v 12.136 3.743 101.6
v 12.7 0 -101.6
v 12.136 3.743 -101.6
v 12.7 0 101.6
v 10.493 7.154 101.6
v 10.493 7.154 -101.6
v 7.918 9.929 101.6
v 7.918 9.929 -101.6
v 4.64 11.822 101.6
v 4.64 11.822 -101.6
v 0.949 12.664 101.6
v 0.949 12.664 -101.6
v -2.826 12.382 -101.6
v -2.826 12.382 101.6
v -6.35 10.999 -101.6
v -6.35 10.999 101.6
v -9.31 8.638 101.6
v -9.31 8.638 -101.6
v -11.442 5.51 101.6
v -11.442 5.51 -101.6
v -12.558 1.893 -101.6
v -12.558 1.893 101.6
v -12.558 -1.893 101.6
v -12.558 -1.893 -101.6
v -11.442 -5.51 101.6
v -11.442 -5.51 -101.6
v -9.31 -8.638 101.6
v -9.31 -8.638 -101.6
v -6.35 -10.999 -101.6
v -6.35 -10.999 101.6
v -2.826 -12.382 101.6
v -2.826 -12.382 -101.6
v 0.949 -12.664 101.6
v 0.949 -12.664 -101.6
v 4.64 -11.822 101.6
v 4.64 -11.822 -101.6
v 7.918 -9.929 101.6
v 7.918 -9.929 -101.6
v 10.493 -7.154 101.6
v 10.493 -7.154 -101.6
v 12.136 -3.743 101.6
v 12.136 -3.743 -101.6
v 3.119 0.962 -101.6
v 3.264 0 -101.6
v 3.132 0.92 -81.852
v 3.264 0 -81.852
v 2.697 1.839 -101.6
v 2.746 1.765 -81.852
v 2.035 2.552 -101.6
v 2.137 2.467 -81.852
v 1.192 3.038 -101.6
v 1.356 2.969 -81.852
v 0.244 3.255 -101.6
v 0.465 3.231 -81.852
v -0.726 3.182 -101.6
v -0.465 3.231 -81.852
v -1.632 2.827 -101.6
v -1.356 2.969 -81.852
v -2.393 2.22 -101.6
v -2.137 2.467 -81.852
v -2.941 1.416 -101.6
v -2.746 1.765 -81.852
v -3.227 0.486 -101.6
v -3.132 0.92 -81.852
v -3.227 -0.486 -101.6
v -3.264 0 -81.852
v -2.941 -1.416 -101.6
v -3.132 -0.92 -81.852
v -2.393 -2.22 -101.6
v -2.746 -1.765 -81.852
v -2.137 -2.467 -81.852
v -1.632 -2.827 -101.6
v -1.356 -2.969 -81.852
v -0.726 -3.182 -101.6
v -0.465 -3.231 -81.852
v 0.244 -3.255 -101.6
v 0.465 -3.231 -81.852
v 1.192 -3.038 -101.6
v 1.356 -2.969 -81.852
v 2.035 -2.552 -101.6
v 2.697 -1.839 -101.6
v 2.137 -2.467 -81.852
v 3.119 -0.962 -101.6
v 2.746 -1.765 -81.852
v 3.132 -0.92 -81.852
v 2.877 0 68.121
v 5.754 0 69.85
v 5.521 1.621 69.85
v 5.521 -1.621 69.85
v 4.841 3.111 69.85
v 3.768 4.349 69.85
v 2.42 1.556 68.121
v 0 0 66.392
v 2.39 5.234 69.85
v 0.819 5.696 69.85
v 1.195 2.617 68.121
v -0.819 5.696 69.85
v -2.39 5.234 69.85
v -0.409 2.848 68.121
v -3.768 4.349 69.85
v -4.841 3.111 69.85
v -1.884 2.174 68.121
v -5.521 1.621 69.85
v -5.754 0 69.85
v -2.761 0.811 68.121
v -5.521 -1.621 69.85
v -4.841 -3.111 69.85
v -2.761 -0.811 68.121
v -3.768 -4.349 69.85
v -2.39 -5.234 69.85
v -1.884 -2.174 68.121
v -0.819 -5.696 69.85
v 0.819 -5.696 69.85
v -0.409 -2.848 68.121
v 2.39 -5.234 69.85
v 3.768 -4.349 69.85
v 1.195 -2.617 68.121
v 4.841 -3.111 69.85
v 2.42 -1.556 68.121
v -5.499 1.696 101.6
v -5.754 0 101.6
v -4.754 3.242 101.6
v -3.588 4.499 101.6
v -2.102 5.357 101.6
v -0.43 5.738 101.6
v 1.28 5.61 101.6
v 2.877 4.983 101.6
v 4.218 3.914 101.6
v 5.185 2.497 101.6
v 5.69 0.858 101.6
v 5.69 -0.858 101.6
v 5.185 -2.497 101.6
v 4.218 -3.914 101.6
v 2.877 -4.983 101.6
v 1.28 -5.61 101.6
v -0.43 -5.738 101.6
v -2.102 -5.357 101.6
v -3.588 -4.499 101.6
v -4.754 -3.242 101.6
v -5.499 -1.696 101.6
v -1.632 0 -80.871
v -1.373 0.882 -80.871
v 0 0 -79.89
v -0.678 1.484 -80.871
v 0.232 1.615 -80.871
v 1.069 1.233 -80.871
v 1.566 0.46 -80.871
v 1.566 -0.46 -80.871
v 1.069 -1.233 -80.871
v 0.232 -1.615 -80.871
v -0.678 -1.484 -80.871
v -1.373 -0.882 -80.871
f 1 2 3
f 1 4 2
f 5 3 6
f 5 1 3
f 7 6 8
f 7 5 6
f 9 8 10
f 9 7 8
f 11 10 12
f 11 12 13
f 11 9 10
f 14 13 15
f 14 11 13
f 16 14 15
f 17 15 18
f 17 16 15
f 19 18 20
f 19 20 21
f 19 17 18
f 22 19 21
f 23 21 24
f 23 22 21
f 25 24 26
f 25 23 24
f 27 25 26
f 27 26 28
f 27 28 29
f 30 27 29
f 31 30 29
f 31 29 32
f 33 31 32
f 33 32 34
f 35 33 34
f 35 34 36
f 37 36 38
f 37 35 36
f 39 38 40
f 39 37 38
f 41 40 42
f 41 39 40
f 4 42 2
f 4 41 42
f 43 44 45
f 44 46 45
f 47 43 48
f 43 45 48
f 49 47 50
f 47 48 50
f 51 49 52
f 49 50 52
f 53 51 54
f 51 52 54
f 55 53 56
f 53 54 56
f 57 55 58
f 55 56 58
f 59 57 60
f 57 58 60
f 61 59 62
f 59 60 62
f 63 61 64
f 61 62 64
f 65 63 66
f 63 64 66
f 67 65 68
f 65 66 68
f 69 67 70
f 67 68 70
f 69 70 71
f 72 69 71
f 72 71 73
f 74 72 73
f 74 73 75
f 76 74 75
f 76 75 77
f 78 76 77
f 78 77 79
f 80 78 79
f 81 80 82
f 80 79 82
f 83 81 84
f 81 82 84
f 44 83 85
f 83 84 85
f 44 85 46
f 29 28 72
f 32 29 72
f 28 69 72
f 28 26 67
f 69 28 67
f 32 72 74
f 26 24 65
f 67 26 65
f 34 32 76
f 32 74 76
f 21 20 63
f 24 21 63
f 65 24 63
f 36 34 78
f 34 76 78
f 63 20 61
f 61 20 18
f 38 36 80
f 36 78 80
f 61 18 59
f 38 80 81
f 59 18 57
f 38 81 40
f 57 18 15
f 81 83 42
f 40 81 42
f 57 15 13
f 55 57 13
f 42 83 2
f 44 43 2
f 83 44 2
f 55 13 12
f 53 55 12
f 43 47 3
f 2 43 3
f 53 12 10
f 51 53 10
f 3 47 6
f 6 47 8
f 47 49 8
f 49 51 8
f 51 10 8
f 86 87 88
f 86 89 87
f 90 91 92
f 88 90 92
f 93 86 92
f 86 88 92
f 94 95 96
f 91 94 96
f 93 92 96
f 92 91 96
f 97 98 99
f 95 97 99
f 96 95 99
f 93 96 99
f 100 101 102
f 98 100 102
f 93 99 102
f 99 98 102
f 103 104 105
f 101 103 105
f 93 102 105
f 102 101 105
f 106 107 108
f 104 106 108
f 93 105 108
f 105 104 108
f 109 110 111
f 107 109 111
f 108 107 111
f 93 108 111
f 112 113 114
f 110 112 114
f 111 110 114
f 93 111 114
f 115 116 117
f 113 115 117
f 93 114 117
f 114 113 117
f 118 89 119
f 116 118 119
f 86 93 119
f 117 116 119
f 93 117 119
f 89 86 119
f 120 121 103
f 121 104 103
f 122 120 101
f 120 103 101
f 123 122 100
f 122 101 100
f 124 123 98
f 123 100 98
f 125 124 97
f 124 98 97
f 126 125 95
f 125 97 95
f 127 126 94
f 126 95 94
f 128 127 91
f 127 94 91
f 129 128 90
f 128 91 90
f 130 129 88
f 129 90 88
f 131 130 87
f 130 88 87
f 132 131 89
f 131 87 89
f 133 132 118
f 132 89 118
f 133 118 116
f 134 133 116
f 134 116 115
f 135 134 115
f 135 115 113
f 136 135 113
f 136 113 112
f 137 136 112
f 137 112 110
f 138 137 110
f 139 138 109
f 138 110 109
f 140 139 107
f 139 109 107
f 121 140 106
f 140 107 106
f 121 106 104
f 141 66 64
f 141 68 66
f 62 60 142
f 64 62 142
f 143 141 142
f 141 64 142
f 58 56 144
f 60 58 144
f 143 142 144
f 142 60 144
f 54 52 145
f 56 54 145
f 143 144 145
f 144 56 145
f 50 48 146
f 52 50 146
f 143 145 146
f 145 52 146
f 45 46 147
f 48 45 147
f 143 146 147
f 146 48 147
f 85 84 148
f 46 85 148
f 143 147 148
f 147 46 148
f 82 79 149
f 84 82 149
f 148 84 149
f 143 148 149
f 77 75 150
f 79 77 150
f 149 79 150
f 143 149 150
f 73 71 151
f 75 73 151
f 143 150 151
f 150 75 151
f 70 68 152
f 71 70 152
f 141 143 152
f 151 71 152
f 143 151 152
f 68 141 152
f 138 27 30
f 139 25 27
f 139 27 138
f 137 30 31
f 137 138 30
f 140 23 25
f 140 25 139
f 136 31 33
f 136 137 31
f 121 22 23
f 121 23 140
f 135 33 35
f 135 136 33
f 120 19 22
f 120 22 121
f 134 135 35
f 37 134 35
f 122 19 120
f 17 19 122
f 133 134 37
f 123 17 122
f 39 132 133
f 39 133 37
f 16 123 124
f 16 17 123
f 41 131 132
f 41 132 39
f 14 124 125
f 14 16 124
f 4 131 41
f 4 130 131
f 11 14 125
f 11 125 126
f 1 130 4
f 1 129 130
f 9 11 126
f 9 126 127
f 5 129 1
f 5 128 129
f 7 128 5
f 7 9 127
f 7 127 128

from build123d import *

# Parameters (mm, degrees)
CROQUIS1_R                     = 12.7
SALIENTE_EXTRUIR2_DEPTH        = 101.6
TALADRO_ROSCADO_1_2_201_D      = 11.50874
TALADRO_ROSCADO_1_2_201_DEPTH  = 31.75
TALADRO_ROSCADO_1_2_201_TIP    = 3.45757432
TALADRO_ROSCADO_5_16_181_D     = 6.5278
TALADRO_ROSCADO_5_16_181_DEPTH = 19.7485
TALADRO_ROSCADO_5_16_181_TIP   = 1.961148974


with BuildPart() as part:
    # Croquis1 → Saliente-Extruir2 (new, symmetric)
    with BuildSketch(Plane.XY):
        Circle(CROQUIS1_R)
    extrude(amount=SALIENTE_EXTRUIR2_DEPTH, both=True)

    # Taladro roscado 1/2-201
    with Locations(Plane.XY.offset(101.6)):
        with Locations((0, 0)):
            Hole(TALADRO_ROSCADO_1_2_201_D / 2, depth=TALADRO_ROSCADO_1_2_201_DEPTH)
            with Locations((0, 0, -(TALADRO_ROSCADO_1_2_201_DEPTH + TALADRO_ROSCADO_1_2_201_TIP / 2))):  # 118° drill point
                Cone(0, TALADRO_ROSCADO_1_2_201_D / 2, TALADRO_ROSCADO_1_2_201_TIP, mode=Mode.SUBTRACT)

    # Taladro roscado 5/16-181
    with Locations(Plane(origin=(0, 0, -101.6), x_dir=(-1, 0, 0), z_dir=(0, 0, -1))):
        with Locations((0, 0)):
            Hole(TALADRO_ROSCADO_5_16_181_D / 2, depth=TALADRO_ROSCADO_5_16_181_DEPTH)
            with Locations((0, 0, -(TALADRO_ROSCADO_5_16_181_DEPTH + TALADRO_ROSCADO_5_16_181_TIP / 2))):  # 118° drill point
                Cone(0, TALADRO_ROSCADO_5_16_181_D / 2, TALADRO_ROSCADO_5_16_181_TIP, mode=Mode.SUBTRACT)


solid = part.part
